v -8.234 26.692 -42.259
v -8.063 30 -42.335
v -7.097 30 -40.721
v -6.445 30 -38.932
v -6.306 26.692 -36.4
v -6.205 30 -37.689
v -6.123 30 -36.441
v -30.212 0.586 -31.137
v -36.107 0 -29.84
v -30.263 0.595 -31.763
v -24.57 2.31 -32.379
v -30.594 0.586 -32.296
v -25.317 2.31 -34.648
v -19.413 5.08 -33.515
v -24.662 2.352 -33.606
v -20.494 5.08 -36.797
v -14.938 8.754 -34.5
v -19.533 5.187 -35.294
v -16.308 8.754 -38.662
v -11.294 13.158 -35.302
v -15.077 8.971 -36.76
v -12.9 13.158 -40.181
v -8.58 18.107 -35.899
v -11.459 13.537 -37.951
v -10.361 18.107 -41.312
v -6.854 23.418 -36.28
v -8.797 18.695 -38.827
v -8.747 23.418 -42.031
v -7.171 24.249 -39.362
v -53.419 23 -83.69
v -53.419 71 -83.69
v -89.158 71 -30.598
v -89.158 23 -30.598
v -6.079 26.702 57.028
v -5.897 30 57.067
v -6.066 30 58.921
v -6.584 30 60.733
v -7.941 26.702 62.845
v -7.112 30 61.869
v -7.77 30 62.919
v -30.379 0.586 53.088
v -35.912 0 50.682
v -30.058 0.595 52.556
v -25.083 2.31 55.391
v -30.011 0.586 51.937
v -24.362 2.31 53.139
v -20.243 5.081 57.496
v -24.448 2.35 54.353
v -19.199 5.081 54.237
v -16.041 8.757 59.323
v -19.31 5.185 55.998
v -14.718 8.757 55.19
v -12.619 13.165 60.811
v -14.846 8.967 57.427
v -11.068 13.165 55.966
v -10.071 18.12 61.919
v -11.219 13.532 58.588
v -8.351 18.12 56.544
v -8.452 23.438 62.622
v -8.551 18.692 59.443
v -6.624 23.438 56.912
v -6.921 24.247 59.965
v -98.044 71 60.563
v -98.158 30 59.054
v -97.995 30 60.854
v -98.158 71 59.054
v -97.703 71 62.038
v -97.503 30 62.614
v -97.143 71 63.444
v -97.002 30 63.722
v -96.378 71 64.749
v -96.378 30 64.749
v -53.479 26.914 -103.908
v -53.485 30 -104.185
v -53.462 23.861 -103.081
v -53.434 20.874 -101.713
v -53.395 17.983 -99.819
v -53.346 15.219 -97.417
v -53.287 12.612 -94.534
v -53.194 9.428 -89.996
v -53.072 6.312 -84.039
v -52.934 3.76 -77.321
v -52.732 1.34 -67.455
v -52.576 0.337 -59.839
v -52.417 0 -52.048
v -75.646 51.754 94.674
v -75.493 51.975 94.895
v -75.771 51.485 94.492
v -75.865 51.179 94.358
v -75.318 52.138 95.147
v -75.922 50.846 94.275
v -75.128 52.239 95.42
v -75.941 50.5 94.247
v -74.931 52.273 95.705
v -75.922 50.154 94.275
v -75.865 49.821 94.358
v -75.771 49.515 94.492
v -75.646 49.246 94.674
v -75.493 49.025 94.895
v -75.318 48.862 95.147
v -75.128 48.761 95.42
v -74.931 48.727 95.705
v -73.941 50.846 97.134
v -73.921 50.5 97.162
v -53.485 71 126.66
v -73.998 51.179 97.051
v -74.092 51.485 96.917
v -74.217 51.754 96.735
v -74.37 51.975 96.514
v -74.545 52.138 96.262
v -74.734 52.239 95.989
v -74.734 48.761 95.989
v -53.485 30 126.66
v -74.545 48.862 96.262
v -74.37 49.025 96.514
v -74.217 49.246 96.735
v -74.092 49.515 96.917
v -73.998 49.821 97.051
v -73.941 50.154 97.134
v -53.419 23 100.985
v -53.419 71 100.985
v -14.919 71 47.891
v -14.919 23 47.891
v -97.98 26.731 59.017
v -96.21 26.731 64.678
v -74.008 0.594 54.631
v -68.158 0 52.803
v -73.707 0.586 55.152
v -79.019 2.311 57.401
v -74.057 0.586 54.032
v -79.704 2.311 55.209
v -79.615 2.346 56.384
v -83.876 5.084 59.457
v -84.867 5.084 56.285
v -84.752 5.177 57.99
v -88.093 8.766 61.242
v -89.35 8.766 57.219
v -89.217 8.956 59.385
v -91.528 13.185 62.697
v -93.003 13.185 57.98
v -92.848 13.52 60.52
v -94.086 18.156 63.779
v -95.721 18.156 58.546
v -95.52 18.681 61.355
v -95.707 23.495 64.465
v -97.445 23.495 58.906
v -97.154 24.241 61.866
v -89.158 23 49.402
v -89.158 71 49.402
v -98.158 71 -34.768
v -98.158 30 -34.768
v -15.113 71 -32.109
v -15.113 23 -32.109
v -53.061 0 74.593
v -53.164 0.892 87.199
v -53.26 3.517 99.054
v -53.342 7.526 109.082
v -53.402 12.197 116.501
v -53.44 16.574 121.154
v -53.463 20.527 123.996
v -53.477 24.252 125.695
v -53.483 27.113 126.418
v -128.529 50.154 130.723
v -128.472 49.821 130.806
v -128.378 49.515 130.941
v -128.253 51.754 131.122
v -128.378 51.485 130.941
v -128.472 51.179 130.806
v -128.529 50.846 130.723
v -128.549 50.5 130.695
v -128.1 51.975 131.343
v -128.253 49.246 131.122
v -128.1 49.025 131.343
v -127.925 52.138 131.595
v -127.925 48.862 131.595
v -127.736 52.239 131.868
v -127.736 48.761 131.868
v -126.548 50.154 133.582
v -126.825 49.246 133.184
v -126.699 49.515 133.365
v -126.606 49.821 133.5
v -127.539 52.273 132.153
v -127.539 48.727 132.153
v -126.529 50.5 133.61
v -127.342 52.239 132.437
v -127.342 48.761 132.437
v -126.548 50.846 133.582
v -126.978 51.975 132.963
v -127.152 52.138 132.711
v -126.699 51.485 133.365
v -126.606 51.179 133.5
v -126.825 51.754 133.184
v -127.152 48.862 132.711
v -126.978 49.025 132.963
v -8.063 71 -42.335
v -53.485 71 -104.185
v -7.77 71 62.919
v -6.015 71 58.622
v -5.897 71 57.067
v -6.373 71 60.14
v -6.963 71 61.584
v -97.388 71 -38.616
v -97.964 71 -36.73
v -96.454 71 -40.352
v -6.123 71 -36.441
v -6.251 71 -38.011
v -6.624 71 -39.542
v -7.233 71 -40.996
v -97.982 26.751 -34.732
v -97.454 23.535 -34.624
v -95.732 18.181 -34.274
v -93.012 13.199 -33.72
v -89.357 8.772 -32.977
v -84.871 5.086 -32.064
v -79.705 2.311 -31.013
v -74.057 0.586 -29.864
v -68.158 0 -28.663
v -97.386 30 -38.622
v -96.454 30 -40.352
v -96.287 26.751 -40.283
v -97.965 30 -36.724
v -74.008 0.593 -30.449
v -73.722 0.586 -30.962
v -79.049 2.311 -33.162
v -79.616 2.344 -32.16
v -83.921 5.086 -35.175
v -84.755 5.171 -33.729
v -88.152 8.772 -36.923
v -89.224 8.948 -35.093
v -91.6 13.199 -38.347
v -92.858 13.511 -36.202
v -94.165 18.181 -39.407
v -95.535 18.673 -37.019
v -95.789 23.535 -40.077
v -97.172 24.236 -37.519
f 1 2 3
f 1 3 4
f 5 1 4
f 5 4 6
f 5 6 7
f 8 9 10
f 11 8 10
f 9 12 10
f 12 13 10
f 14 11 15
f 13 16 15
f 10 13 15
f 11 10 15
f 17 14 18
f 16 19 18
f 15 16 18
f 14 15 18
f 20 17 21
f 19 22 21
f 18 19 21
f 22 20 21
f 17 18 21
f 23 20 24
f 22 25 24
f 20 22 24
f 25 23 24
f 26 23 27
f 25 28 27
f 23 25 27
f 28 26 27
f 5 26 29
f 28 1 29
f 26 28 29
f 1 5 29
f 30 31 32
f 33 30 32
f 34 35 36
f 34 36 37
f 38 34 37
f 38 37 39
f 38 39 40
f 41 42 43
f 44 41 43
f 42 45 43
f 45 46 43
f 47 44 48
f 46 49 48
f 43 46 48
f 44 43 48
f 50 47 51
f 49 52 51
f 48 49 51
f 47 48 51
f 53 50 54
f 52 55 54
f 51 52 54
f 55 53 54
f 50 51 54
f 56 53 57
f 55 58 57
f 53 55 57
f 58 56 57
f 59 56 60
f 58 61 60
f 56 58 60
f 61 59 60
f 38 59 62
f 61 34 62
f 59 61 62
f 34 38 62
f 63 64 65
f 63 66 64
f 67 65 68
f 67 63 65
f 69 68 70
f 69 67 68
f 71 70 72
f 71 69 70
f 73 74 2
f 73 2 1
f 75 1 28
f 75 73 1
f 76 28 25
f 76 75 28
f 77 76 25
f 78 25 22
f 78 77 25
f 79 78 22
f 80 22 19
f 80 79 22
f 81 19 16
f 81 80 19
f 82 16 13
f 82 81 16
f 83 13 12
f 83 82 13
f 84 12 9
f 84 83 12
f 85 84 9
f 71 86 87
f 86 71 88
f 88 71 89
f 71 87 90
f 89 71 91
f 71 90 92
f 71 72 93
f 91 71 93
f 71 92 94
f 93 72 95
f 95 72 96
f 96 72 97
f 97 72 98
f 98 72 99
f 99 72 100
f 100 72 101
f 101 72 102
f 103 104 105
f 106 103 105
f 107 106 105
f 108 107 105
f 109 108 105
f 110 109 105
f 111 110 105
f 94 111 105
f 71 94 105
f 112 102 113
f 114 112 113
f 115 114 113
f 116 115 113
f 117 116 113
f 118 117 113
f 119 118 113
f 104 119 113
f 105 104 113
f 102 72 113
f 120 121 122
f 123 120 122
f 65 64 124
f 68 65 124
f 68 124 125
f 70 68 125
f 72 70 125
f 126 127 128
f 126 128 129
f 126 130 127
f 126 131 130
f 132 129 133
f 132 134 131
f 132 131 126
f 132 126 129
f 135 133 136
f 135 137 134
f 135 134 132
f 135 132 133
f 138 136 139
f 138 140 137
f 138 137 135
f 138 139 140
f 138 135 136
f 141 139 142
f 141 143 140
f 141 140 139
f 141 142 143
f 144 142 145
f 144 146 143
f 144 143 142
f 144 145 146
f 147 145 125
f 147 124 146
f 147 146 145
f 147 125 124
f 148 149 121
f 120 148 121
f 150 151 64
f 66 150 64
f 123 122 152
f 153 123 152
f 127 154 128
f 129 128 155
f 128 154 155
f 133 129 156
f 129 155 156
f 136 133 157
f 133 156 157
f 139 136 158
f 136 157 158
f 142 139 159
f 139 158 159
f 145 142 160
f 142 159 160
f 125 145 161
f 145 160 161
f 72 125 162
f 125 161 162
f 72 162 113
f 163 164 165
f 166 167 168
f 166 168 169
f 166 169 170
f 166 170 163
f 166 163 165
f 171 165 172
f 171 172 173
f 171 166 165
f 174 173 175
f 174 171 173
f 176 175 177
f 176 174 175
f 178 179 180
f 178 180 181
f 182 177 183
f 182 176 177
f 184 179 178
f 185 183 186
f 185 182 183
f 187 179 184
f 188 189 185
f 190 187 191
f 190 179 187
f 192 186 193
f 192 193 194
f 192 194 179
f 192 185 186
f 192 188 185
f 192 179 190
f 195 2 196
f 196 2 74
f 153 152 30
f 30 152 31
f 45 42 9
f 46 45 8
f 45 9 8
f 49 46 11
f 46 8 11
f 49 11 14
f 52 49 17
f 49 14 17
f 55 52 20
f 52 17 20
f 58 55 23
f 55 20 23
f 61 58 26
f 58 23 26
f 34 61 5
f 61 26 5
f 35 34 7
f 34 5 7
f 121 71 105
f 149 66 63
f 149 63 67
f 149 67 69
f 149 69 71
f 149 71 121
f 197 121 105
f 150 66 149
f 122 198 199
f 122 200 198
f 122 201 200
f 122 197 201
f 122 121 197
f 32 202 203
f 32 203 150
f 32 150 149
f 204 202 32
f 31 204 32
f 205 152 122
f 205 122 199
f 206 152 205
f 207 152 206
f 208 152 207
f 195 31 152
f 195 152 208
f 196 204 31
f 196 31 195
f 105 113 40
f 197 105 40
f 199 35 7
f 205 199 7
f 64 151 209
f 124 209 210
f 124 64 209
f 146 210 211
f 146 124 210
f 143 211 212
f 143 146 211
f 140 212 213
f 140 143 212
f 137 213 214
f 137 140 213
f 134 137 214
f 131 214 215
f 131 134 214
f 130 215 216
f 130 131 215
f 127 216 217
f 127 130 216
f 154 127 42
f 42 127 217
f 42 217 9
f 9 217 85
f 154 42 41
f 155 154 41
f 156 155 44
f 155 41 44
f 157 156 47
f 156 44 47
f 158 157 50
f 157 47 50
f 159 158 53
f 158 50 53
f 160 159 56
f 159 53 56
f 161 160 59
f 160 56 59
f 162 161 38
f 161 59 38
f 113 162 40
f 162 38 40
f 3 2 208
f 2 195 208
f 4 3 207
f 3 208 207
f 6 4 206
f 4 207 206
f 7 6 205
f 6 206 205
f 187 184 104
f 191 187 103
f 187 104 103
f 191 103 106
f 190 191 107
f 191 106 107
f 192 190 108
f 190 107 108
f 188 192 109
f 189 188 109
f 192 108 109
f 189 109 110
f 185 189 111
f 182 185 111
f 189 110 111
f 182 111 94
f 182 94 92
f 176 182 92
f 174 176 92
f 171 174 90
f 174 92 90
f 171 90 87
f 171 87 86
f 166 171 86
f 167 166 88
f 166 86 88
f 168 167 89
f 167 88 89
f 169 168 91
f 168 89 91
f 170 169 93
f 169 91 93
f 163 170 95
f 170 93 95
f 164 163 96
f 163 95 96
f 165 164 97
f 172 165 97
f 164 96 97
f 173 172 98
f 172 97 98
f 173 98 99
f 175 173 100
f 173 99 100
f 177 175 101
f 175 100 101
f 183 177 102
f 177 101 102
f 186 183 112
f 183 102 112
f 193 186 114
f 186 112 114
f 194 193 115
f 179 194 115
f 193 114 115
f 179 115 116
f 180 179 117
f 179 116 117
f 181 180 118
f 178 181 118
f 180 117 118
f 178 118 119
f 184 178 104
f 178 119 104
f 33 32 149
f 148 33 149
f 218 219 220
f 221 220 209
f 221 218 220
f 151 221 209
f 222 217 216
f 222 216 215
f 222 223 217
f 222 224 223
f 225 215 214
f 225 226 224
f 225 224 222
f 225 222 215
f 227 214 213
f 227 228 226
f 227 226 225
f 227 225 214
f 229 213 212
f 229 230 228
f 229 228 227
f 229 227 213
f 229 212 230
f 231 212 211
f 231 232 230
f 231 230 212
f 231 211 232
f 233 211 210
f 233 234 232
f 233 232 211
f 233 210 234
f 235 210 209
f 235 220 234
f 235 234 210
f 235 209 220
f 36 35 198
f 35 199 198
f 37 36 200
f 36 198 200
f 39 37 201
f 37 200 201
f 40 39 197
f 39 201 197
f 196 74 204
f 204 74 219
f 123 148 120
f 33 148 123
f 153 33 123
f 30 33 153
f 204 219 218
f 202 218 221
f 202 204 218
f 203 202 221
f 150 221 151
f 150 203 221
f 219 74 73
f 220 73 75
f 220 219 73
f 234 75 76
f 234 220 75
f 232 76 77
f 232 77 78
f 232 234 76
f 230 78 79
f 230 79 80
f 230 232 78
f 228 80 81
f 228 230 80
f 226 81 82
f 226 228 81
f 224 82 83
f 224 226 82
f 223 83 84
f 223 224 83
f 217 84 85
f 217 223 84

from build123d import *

# Parameters (mm, degrees)
BOSS_EXTRUDE1_DEPTH = 71
CUT_EXTRUDE1_DEPTH  = 48
FILLET1_R           = 30
FILLET2_R           = 10
SKETCH3_R           = 1.773463316
BOSS_EXTRUDE2_DEPTH = 64


with BuildPart() as part:
    # Sketch1 → Boss-Extrude1 (new body)
    with BuildSketch(Plane(origin=(0, 0, 0), x_dir=(1, 0, 0), z_dir=(0, 1, 0))):
        Polygon((-53.484564952, 104.184508732), (-98.158322107, 37.819944229), (-98.158322107, -62.180055771), (-53.484564952, -126.659696939), (-5.888781519, -60.295132437), (-6.131233796, 39.704573647), align=None)
    extrude(amount=BOSS_EXTRUDE1_DEPTH)

    # Sketch2 → Cut-Extrude1 (cut)
    with BuildSketch(Plane(origin=(0, 71, 0), x_dir=(1, 0, 0), z_dir=(0, 1, 0))):
        Polygon((-53.419316383, 83.690098923), (-89.158322107, 30.598447321), (-89.158322107, -49.401552679), (-53.419316383, -100.985265614), (-14.918881702, -47.891189489), (-15.112843524, 32.108575378), align=None)
    extrude(amount=-CUT_EXTRUDE1_DEPTH, mode=Mode.SUBTRACT)

    # Fillet1
    fillet1_edges = [part.edges().sort_by_distance(p)[0] for p in [
        (-6.010007658, 0, 10.295279395),
        (-29.686673235, 0, 93.477414688),
        (-75.821443529, 0, 94.419876355),
        (-98.158322107, 0, 12.180055771),
        (-75.821443529, 0, -71.002226481),
        (-29.807899374, 0, -71.94454119),
    ]]
    fillet(fillet1_edges, radius=FILLET1_R)

    # Fillet2
    fillet2_edges = [part.edges().sort_by_distance(p)[0] for p in [
        (-6.131233796, 50.5, -39.704573647),
        (-5.888781519, 50.5, 60.295132437),
        (-98.158322107, 50.5, 62.180055771),
        (-98.158322107, 50.5, -37.819944229),
        (-15.180720611, 8.520303105, -36.726448686),
        (-14.946943145, 8.525742818, 57.394836212),
        (-89.134201731, 8.55209861, -35.065579718),
        (-89.123112182, 8.541258724, 59.355901315),
    ]]
    fillet(fillet2_edges, radius=FILLET2_R)

    # Sketch3 → Boss-Extrude2 (add)
    with BuildSketch(Plane(origin=(-95.430334367, 0, 66.117483062), x_dir=(0.569502992, 0, 0.821989259), z_dir=(-0.821989259, 0, 0.569502992))):
        with Locations((35.994445749, 50.5)):
            Circle(SKETCH3_R)
    extrude(amount=BOSS_EXTRUDE2_DEPTH)


solid = part.part
